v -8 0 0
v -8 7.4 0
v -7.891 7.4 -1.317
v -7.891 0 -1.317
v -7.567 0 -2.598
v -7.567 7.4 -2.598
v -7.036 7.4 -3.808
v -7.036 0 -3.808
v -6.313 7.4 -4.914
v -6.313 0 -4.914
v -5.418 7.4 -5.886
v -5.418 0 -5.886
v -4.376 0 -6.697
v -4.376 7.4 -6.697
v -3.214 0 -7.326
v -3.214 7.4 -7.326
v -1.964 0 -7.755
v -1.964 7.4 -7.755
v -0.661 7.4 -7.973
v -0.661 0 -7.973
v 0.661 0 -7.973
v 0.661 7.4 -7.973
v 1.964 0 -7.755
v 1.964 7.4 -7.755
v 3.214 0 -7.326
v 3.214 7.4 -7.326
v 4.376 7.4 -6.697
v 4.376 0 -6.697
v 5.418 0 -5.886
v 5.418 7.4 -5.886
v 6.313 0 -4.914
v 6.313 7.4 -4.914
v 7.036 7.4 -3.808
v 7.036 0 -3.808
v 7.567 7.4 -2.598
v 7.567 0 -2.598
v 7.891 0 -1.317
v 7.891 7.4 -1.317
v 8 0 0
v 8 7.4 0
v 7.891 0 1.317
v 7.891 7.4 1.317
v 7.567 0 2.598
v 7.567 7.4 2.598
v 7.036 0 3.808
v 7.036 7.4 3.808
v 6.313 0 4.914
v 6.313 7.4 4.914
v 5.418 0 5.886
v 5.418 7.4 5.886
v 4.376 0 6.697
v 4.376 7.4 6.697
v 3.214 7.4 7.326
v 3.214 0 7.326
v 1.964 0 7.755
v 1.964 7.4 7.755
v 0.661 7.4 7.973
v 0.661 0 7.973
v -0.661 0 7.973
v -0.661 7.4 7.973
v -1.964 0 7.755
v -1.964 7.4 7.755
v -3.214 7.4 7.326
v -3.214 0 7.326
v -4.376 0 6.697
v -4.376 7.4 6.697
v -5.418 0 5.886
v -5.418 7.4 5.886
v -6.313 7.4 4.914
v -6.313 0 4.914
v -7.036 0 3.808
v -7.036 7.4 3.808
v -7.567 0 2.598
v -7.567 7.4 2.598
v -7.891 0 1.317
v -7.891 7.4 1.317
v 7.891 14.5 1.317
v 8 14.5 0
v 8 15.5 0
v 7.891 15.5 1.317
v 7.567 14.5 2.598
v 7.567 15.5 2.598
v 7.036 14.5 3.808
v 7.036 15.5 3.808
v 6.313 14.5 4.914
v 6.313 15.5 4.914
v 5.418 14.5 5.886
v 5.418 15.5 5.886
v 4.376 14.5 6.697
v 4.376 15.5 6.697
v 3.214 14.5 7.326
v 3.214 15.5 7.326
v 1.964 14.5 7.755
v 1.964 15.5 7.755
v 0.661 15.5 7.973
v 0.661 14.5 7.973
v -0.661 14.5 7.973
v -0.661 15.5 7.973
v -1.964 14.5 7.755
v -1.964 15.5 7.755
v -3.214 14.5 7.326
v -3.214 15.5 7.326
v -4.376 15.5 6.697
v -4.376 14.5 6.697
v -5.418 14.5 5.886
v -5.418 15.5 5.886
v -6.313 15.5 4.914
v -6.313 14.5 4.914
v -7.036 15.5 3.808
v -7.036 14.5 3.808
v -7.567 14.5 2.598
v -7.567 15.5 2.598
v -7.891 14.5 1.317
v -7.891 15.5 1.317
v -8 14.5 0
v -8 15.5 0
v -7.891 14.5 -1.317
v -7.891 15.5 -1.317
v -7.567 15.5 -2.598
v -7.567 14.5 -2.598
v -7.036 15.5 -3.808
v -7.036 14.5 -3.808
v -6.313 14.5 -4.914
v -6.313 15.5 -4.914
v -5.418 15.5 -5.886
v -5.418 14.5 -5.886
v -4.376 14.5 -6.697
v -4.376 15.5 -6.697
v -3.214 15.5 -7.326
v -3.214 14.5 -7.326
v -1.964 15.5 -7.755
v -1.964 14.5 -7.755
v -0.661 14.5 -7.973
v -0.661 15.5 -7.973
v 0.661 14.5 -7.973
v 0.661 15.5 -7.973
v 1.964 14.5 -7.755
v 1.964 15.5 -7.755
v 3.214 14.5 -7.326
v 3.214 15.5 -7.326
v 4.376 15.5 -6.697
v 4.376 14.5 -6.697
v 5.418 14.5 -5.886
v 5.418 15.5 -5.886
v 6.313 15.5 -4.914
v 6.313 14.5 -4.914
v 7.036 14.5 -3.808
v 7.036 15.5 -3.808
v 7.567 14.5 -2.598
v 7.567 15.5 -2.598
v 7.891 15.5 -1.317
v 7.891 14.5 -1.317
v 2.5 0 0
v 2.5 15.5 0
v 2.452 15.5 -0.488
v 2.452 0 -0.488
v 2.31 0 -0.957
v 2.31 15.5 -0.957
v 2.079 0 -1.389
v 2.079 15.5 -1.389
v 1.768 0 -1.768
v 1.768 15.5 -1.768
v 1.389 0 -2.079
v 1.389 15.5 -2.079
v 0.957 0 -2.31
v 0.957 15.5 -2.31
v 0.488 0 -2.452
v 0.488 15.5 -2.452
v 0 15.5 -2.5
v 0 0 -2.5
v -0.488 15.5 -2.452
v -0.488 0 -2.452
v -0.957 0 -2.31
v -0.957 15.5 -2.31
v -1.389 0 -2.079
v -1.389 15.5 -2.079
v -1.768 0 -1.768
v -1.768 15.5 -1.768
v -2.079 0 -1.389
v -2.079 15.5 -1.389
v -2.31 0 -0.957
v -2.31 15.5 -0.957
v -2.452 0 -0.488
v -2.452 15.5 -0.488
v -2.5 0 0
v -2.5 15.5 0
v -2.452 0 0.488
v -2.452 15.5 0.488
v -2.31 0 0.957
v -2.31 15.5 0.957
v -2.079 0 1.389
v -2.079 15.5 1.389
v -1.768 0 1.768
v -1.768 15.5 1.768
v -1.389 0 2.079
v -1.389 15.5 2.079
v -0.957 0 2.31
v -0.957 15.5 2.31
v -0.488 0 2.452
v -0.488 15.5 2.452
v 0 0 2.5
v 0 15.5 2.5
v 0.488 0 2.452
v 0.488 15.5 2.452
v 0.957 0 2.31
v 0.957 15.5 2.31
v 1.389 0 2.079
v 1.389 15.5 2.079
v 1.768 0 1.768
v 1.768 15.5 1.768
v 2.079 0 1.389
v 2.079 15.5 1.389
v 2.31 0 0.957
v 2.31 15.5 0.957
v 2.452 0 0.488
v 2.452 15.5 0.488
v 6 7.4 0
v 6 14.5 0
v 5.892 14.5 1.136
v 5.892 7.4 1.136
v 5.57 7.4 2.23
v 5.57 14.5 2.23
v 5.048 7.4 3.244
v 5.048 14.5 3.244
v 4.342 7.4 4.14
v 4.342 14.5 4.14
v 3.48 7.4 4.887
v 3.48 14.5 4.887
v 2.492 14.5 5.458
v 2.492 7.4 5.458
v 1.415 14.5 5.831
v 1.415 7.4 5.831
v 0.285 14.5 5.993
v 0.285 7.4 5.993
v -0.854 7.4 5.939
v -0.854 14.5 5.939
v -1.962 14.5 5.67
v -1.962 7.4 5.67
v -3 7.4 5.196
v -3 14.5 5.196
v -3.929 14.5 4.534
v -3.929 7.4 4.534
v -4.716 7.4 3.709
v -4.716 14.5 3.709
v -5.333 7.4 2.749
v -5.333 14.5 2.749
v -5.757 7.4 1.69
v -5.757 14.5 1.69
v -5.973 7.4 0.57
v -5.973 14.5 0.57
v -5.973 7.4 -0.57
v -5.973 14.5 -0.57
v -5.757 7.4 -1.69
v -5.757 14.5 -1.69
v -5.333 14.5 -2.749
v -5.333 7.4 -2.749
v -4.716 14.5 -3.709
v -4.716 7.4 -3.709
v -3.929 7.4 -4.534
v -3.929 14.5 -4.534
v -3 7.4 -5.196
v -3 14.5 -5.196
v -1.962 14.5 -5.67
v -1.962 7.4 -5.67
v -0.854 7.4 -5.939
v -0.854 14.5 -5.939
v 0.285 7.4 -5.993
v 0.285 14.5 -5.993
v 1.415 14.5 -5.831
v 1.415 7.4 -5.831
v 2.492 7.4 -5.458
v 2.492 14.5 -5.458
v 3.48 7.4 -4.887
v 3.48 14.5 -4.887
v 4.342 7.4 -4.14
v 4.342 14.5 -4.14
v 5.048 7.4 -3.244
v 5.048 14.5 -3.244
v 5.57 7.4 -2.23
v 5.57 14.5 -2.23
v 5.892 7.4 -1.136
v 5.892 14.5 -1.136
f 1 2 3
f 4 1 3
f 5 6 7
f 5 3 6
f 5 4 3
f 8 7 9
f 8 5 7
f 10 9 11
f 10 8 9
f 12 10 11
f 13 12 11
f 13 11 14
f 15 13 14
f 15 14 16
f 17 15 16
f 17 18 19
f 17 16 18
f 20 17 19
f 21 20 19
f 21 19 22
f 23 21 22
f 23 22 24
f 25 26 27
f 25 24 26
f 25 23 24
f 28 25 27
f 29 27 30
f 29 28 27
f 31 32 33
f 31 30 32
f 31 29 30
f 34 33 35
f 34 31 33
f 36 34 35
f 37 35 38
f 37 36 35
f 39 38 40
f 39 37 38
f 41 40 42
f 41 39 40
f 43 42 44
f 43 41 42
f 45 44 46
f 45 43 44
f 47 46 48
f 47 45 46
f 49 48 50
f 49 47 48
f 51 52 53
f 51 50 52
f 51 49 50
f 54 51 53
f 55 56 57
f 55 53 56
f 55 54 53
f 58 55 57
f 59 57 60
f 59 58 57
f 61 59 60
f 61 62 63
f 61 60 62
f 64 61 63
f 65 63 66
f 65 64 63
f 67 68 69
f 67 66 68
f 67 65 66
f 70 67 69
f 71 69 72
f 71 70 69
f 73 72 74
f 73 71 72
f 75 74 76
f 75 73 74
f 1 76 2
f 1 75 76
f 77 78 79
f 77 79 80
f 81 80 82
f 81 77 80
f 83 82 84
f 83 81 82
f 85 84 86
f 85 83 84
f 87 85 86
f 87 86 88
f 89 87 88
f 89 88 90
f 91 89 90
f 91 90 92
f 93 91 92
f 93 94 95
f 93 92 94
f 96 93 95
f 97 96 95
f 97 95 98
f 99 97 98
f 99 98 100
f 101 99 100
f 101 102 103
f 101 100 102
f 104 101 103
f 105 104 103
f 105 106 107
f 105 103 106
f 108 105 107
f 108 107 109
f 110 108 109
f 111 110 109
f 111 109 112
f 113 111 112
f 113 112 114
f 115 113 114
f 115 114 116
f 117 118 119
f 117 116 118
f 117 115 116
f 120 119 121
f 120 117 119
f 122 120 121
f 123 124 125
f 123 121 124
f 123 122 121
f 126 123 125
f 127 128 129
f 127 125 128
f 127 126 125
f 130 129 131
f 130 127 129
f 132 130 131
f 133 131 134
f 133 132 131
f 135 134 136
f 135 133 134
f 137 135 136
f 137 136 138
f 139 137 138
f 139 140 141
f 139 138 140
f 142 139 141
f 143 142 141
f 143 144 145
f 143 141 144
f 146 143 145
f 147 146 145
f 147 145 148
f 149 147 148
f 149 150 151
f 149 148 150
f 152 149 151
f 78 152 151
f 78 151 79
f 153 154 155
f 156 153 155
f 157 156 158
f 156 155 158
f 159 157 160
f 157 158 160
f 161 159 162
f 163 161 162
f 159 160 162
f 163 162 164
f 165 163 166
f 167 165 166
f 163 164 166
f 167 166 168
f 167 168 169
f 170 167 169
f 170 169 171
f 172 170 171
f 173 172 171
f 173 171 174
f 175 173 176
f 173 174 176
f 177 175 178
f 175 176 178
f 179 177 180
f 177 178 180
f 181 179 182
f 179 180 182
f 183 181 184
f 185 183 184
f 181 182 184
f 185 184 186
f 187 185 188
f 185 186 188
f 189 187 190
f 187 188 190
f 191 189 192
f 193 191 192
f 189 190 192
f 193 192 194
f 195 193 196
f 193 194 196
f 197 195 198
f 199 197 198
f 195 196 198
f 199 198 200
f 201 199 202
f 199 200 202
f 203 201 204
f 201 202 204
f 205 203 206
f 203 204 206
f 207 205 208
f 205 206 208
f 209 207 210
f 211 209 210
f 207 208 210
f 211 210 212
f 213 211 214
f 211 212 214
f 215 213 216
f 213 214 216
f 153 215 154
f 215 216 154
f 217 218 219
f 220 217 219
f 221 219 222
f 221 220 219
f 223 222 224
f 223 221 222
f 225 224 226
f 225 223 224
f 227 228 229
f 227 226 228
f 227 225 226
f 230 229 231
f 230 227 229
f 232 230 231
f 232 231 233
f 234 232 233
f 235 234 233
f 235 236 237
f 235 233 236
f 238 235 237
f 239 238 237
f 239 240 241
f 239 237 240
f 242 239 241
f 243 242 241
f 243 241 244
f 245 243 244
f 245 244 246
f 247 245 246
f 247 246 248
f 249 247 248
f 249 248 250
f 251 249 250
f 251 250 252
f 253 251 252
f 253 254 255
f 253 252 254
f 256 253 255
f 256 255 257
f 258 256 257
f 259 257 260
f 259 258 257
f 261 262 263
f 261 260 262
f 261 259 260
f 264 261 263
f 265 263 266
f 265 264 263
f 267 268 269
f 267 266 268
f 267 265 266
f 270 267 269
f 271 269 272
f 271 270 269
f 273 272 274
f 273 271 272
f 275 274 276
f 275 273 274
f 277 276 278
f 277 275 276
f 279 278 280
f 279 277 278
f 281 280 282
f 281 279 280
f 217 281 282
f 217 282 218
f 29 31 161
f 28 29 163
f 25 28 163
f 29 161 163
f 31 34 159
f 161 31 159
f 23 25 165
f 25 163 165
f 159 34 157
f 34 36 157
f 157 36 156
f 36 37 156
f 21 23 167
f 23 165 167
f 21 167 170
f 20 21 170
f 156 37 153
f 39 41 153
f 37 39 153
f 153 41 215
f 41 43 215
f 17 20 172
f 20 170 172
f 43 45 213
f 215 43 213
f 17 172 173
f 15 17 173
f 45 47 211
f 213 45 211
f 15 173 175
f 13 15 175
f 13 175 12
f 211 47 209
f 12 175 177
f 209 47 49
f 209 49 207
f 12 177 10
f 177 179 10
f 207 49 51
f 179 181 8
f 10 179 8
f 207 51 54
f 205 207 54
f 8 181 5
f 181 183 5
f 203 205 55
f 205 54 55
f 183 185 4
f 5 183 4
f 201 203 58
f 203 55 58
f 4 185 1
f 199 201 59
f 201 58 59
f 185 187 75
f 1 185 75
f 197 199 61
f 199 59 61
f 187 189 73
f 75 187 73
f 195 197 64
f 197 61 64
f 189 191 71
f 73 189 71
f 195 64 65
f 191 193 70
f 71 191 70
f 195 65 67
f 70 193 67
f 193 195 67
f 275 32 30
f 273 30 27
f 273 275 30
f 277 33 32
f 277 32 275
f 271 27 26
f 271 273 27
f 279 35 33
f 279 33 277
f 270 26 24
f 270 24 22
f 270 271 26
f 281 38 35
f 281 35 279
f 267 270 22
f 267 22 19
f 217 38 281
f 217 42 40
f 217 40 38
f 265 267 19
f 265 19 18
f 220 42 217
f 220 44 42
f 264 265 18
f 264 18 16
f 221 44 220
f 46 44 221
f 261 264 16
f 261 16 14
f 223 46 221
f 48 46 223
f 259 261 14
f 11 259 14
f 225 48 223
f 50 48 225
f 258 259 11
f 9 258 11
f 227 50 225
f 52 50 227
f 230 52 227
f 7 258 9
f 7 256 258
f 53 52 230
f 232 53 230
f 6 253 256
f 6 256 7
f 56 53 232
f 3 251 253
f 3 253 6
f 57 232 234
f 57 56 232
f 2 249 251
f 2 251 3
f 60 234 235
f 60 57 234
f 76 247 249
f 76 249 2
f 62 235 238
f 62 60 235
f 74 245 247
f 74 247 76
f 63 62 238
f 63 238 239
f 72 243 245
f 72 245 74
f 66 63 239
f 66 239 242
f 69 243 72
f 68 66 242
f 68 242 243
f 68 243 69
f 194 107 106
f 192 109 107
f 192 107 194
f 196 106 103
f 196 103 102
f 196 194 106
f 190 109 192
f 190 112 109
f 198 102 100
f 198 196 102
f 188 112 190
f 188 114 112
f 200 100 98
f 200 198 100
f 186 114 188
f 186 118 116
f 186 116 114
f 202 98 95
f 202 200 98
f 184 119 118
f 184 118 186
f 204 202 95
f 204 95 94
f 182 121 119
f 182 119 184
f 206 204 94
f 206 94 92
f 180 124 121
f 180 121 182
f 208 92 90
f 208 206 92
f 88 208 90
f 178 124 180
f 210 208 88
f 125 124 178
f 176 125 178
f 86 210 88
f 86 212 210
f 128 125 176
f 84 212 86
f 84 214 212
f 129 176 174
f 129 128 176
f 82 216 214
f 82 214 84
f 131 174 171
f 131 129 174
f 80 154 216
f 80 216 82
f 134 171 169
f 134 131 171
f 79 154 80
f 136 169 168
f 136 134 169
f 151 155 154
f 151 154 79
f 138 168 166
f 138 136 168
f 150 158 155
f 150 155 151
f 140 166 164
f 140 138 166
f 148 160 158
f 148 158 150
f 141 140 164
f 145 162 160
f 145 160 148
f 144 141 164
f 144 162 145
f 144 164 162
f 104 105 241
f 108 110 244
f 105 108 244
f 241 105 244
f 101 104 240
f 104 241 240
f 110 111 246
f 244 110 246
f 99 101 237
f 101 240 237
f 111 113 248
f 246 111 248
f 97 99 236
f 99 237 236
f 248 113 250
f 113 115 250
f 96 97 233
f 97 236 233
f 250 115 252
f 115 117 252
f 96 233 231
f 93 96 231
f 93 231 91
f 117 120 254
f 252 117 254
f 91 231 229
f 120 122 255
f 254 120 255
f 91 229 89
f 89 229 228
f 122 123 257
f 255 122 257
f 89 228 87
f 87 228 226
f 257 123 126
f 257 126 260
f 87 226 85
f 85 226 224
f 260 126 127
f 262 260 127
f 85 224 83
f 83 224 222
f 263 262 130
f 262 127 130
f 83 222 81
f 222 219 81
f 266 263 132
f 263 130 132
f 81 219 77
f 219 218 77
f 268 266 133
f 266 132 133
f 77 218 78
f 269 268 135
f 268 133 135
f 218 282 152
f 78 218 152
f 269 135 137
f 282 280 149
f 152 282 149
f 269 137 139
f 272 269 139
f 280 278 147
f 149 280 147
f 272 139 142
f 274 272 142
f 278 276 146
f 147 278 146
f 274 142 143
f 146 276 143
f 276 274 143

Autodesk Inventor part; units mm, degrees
ref_plane "YZ Plane" through (0, 0, 0) normal (1, 0, 0) x (0, 1, 0)
ref_plane "XZ Plane" through (0, 0, 0) normal (0, 1, 0) x (-1, 0, 0)
ref_plane "XY Plane" through (0, 0, 0) normal (0, 0, 1) x (1, 0, 0)
sketch "Sketch1" plane through (0, 0, 0) normal (0, 1, 0) x (-1, 0, 0)
  circle A0 centre (0, 0) radius 8
  dimension "d0" = 16
extrude "Extrusion1" add sketch "Sketch1" along normal blind 7.4
sketch "Sketch2" plane through (0, 7.4, 0) normal (0, 1, 0) x (1, 0, 0)
  circle A0 centre (0, 0) radius 6
  dimension "d3" = 12
extrude "Extrusion2" add sketch "Sketch2" along normal blind 7.1
sketch "Sketch3" plane through (0, 14.5, 0) normal (0, 1, 0) x (1, 0, 0)
  circle A0 centre (0, 0) radius 8
extrude "Extrusion3" add sketch "Sketch3" along normal blind 1
sketch "Sketch4" plane through (0, 15.5, 0) normal (0, 1, 0) x (1, 0, 0)
  circle A0 centre (0, 0) radius 2.5
  dimension "d8" = 5
extrude "Extrusion4" cut sketch "Sketch4" against normal through all
properties part number "GT2 20T"
